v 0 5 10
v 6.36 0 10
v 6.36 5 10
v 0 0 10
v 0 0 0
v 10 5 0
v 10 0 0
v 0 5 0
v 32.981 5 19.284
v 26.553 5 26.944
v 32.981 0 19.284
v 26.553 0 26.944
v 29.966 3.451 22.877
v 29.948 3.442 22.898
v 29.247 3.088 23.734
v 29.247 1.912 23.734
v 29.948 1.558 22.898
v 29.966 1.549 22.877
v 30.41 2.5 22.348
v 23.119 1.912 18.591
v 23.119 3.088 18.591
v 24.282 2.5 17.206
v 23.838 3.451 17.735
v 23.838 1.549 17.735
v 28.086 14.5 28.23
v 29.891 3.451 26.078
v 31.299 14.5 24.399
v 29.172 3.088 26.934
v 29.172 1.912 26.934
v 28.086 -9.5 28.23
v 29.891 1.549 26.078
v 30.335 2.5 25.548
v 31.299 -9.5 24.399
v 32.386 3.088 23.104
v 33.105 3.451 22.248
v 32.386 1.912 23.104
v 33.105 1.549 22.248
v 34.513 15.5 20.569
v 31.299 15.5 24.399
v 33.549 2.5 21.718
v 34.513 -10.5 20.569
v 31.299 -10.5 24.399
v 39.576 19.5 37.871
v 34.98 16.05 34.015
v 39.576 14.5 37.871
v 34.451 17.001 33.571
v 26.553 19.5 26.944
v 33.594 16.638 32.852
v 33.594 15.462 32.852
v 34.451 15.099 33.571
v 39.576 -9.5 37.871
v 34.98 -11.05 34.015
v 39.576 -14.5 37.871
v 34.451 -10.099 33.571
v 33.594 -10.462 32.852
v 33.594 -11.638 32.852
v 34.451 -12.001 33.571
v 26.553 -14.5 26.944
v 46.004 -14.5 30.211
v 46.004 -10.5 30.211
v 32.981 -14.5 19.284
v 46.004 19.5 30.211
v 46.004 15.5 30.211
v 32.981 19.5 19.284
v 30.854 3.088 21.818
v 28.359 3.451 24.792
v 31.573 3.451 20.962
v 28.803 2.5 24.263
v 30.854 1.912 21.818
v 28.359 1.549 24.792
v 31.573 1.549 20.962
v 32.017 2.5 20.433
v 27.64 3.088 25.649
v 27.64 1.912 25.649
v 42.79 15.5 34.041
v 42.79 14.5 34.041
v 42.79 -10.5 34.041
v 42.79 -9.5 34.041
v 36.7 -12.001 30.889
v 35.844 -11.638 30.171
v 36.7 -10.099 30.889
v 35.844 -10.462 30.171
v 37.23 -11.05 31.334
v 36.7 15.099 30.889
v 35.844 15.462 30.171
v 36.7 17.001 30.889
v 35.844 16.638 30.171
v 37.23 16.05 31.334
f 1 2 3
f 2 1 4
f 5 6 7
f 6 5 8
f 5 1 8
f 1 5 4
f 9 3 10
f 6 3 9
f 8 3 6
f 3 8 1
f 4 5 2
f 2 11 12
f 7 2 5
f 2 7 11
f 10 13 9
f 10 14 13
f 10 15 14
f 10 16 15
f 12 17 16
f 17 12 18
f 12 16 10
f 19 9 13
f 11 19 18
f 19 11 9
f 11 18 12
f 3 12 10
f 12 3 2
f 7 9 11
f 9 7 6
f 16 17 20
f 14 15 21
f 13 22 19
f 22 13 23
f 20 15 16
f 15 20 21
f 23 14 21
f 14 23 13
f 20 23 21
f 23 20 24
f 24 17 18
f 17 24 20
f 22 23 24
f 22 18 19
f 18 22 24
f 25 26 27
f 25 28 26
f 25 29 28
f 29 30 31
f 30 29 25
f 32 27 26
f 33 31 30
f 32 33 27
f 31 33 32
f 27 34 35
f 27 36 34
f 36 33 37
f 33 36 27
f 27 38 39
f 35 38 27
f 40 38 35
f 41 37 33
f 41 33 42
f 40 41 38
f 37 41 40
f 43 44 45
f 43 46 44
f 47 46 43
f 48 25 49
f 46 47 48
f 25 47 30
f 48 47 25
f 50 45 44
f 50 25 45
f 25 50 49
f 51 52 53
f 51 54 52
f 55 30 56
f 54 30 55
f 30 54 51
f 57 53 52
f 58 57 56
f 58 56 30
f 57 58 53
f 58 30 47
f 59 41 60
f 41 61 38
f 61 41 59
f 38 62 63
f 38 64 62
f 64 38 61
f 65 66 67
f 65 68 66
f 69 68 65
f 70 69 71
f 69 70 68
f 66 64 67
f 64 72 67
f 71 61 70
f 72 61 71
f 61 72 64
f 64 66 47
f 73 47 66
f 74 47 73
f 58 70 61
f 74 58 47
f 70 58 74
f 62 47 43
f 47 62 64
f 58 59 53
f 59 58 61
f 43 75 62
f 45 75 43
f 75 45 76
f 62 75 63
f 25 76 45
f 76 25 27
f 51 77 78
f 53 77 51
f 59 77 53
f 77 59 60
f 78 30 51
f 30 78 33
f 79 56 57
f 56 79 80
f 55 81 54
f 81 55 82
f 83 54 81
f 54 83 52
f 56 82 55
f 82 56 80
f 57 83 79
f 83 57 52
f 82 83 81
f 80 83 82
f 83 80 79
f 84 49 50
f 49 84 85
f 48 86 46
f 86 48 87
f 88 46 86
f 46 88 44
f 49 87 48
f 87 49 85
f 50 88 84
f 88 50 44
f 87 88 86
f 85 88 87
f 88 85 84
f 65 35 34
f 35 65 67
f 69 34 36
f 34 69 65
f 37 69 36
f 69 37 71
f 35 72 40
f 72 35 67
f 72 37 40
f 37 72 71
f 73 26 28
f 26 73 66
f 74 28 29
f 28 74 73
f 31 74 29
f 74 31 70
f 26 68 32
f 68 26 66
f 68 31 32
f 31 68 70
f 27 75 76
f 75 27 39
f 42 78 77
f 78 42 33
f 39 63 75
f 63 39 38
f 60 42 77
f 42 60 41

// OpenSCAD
// Stage 1: simple dogleg forearm block
// X = length/reach, Y = width, Z = height
//
// First 10 mm runs straight along X.
// Remaining 30 mm bends 40 degrees in the XZ plane at [10, 0, 0].

length_x = 40;
width_y = 5;
height_z = 10;
bend_x = 10;
bend_angle = -40;

seg1_len = bend_x;
seg2_len = length_x - bend_x;

servo_body_clearance_y = 24.0;
servo_ear_hole_spacing_y = 27.1;
servo_ear_span_y = 31.8;
servo_ear_clearance_y = 1.2;
fork_prong_w = 5;
fork_gap_y = servo_body_clearance_y;
fork_total_w = fork_gap_y + 2 * fork_prong_w;
fork_upper_prong_len = 15;
fork_lower_prong_len = 15;
fork_back_len = 2;
fork_ear_pilot_d = 2.0;
fork_ear_pilot_x = 8;
fork_ear_pilot_depth = 3.5;
fork_back_guide_d = 2.0;
fork_back_guide_spacing_z = 5.0;
servo_body_cut_y = 26.0;
servo_body_cut_z = 5.0;
arm_tip_pilot_d = 2.0;
arm_tip_pilot_depth = 8;

// "both", "arm", "fork", "arm_print_side", or "fork_print_top_down"
show_part = "both";

module arm_segment(len) {
    cube([len, width_y, height_z], center = false);
}

module asymmetric_tuning_fork_jaw() {
    total_w = fork_total_w;
    center_y = width_y / 2;
    upper_y = center_y + fork_gap_y / 2;
    lower_y = center_y - fork_gap_y / 2 - fork_prong_w;

    difference() {
        union() {
            // Thin back bridge joins the narrow arm to the two prongs.
            translate([0, center_y - total_w / 2, 0])
                cube([fork_back_len, total_w, height_z], center = false);

            // Two straight prongs extend forward with the notch between them.
            translate([fork_back_len, upper_y, 0])
                cube([fork_upper_prong_len, fork_prong_w, height_z], center = false);

            translate([fork_back_len, lower_y, 0])
                cube([fork_lower_prong_len, fork_prong_w, height_z], center = false);
        }

        // Pilot holes for the SG90 ear screws, drilled vertically into shelves.
        for (y = [
            center_y - servo_ear_hole_spacing_y / 2,
            center_y + servo_ear_hole_spacing_y / 2
        ])
            translate([fork_back_len + fork_ear_pilot_x, y, height_z - fork_ear_pilot_depth])
                cylinder(h = fork_ear_pilot_depth + 0.1, d = fork_ear_pilot_d);

        // Servo body clearance cut inside the prong area.
        translate([
            fork_back_len,
            center_y - servo_body_cut_y / 2,
            0
        ])
            cube([fork_upper_prong_len + 0.2, servo_body_cut_y, servo_body_cut_z], center = false);

        // Guide holes through the thin back wall for screwing this fork to the arm.
        for (z = [
            height_z / 2 - fork_back_guide_spacing_z / 2,
            height_z / 2 + fork_back_guide_spacing_z / 2
        ])
            translate([-0.1, width_y / 2, z])
                rotate([0, 90, 0])
                    cylinder(h = fork_back_len + 0.2, d = fork_back_guide_d);
    }
}

module dogleg_arm() {
    difference() {
        union() {
            arm_segment(seg1_len);

            translate([bend_x, 0, 0])
                rotate([0, bend_angle, 0])
                    arm_segment(seg2_len);
        }

        translate([bend_x, 0, 0])
            rotate([0, bend_angle, 0])
                translate([seg2_len - arm_tip_pilot_depth, width_y / 2, height_z / 2])
                    rotate([0, 90, 0])
                        cylinder(h = arm_tip_pilot_depth + 0.2, d = arm_tip_pilot_d, center = false);
    }
}

if (show_part == "arm") {
    dogleg_arm();
} else if (show_part == "fork") {
    asymmetric_tuning_fork_jaw();
} else if (show_part == "arm_print_side") {
    // Rotate arm so the 5 mm Y width becomes print height Z.
    // This lays the 10 mm tall side face on the build plate.
    rotate([90, 0, 0])
        dogleg_arm();
} else if (show_part == "fork_print_top_down") {
    // Flip fork so the original top/shelf face sits on the bed.
    translate([0, 0, height_z])
        rotate([180, 0, 0])
            asymmetric_tuning_fork_jaw();
} else {
    dogleg_arm();

    translate([bend_x, 0, 0])
        rotate([0, bend_angle, 0])
            translate([seg2_len, 0, 0])
                asymmetric_tuning_fork_jaw();
}
